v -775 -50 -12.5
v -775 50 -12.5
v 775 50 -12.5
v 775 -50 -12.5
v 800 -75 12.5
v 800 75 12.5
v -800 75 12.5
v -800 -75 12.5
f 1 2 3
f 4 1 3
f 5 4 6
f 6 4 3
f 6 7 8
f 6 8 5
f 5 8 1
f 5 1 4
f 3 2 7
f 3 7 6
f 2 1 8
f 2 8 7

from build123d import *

# Parameters (mm, degrees)
F0_W     = 1600
F0_H     = 150
F1_DEPTH = 12.5
F2_SIZE  = 24.99999


# Not quite as in the source:
# - a fillet or chamfer is up to 0.001 mm smaller than in the source, because OpenCascade refuses the exact size


with BuildPart() as f1:
    # F0 (on Top) → F1 (new body, symmetric)
    with BuildSketch(Plane.XY):
        Rectangle(F0_W, F0_H)
    extrude(amount=F1_DEPTH, both=True)

    # F2 (size 25 in the source; OpenCascade refuses exactly that, so slightly less here)
    f2_edges = [f1.edges().sort_by_distance(p)[0] for p in [
        (0, 75, -12.5),
        (-800, 0, -12.5),
        (0, -75, -12.5),
        (800, 0, -12.5),
    ]]
    chamfer(f2_edges, length=F2_SIZE)


solid = f1.part
